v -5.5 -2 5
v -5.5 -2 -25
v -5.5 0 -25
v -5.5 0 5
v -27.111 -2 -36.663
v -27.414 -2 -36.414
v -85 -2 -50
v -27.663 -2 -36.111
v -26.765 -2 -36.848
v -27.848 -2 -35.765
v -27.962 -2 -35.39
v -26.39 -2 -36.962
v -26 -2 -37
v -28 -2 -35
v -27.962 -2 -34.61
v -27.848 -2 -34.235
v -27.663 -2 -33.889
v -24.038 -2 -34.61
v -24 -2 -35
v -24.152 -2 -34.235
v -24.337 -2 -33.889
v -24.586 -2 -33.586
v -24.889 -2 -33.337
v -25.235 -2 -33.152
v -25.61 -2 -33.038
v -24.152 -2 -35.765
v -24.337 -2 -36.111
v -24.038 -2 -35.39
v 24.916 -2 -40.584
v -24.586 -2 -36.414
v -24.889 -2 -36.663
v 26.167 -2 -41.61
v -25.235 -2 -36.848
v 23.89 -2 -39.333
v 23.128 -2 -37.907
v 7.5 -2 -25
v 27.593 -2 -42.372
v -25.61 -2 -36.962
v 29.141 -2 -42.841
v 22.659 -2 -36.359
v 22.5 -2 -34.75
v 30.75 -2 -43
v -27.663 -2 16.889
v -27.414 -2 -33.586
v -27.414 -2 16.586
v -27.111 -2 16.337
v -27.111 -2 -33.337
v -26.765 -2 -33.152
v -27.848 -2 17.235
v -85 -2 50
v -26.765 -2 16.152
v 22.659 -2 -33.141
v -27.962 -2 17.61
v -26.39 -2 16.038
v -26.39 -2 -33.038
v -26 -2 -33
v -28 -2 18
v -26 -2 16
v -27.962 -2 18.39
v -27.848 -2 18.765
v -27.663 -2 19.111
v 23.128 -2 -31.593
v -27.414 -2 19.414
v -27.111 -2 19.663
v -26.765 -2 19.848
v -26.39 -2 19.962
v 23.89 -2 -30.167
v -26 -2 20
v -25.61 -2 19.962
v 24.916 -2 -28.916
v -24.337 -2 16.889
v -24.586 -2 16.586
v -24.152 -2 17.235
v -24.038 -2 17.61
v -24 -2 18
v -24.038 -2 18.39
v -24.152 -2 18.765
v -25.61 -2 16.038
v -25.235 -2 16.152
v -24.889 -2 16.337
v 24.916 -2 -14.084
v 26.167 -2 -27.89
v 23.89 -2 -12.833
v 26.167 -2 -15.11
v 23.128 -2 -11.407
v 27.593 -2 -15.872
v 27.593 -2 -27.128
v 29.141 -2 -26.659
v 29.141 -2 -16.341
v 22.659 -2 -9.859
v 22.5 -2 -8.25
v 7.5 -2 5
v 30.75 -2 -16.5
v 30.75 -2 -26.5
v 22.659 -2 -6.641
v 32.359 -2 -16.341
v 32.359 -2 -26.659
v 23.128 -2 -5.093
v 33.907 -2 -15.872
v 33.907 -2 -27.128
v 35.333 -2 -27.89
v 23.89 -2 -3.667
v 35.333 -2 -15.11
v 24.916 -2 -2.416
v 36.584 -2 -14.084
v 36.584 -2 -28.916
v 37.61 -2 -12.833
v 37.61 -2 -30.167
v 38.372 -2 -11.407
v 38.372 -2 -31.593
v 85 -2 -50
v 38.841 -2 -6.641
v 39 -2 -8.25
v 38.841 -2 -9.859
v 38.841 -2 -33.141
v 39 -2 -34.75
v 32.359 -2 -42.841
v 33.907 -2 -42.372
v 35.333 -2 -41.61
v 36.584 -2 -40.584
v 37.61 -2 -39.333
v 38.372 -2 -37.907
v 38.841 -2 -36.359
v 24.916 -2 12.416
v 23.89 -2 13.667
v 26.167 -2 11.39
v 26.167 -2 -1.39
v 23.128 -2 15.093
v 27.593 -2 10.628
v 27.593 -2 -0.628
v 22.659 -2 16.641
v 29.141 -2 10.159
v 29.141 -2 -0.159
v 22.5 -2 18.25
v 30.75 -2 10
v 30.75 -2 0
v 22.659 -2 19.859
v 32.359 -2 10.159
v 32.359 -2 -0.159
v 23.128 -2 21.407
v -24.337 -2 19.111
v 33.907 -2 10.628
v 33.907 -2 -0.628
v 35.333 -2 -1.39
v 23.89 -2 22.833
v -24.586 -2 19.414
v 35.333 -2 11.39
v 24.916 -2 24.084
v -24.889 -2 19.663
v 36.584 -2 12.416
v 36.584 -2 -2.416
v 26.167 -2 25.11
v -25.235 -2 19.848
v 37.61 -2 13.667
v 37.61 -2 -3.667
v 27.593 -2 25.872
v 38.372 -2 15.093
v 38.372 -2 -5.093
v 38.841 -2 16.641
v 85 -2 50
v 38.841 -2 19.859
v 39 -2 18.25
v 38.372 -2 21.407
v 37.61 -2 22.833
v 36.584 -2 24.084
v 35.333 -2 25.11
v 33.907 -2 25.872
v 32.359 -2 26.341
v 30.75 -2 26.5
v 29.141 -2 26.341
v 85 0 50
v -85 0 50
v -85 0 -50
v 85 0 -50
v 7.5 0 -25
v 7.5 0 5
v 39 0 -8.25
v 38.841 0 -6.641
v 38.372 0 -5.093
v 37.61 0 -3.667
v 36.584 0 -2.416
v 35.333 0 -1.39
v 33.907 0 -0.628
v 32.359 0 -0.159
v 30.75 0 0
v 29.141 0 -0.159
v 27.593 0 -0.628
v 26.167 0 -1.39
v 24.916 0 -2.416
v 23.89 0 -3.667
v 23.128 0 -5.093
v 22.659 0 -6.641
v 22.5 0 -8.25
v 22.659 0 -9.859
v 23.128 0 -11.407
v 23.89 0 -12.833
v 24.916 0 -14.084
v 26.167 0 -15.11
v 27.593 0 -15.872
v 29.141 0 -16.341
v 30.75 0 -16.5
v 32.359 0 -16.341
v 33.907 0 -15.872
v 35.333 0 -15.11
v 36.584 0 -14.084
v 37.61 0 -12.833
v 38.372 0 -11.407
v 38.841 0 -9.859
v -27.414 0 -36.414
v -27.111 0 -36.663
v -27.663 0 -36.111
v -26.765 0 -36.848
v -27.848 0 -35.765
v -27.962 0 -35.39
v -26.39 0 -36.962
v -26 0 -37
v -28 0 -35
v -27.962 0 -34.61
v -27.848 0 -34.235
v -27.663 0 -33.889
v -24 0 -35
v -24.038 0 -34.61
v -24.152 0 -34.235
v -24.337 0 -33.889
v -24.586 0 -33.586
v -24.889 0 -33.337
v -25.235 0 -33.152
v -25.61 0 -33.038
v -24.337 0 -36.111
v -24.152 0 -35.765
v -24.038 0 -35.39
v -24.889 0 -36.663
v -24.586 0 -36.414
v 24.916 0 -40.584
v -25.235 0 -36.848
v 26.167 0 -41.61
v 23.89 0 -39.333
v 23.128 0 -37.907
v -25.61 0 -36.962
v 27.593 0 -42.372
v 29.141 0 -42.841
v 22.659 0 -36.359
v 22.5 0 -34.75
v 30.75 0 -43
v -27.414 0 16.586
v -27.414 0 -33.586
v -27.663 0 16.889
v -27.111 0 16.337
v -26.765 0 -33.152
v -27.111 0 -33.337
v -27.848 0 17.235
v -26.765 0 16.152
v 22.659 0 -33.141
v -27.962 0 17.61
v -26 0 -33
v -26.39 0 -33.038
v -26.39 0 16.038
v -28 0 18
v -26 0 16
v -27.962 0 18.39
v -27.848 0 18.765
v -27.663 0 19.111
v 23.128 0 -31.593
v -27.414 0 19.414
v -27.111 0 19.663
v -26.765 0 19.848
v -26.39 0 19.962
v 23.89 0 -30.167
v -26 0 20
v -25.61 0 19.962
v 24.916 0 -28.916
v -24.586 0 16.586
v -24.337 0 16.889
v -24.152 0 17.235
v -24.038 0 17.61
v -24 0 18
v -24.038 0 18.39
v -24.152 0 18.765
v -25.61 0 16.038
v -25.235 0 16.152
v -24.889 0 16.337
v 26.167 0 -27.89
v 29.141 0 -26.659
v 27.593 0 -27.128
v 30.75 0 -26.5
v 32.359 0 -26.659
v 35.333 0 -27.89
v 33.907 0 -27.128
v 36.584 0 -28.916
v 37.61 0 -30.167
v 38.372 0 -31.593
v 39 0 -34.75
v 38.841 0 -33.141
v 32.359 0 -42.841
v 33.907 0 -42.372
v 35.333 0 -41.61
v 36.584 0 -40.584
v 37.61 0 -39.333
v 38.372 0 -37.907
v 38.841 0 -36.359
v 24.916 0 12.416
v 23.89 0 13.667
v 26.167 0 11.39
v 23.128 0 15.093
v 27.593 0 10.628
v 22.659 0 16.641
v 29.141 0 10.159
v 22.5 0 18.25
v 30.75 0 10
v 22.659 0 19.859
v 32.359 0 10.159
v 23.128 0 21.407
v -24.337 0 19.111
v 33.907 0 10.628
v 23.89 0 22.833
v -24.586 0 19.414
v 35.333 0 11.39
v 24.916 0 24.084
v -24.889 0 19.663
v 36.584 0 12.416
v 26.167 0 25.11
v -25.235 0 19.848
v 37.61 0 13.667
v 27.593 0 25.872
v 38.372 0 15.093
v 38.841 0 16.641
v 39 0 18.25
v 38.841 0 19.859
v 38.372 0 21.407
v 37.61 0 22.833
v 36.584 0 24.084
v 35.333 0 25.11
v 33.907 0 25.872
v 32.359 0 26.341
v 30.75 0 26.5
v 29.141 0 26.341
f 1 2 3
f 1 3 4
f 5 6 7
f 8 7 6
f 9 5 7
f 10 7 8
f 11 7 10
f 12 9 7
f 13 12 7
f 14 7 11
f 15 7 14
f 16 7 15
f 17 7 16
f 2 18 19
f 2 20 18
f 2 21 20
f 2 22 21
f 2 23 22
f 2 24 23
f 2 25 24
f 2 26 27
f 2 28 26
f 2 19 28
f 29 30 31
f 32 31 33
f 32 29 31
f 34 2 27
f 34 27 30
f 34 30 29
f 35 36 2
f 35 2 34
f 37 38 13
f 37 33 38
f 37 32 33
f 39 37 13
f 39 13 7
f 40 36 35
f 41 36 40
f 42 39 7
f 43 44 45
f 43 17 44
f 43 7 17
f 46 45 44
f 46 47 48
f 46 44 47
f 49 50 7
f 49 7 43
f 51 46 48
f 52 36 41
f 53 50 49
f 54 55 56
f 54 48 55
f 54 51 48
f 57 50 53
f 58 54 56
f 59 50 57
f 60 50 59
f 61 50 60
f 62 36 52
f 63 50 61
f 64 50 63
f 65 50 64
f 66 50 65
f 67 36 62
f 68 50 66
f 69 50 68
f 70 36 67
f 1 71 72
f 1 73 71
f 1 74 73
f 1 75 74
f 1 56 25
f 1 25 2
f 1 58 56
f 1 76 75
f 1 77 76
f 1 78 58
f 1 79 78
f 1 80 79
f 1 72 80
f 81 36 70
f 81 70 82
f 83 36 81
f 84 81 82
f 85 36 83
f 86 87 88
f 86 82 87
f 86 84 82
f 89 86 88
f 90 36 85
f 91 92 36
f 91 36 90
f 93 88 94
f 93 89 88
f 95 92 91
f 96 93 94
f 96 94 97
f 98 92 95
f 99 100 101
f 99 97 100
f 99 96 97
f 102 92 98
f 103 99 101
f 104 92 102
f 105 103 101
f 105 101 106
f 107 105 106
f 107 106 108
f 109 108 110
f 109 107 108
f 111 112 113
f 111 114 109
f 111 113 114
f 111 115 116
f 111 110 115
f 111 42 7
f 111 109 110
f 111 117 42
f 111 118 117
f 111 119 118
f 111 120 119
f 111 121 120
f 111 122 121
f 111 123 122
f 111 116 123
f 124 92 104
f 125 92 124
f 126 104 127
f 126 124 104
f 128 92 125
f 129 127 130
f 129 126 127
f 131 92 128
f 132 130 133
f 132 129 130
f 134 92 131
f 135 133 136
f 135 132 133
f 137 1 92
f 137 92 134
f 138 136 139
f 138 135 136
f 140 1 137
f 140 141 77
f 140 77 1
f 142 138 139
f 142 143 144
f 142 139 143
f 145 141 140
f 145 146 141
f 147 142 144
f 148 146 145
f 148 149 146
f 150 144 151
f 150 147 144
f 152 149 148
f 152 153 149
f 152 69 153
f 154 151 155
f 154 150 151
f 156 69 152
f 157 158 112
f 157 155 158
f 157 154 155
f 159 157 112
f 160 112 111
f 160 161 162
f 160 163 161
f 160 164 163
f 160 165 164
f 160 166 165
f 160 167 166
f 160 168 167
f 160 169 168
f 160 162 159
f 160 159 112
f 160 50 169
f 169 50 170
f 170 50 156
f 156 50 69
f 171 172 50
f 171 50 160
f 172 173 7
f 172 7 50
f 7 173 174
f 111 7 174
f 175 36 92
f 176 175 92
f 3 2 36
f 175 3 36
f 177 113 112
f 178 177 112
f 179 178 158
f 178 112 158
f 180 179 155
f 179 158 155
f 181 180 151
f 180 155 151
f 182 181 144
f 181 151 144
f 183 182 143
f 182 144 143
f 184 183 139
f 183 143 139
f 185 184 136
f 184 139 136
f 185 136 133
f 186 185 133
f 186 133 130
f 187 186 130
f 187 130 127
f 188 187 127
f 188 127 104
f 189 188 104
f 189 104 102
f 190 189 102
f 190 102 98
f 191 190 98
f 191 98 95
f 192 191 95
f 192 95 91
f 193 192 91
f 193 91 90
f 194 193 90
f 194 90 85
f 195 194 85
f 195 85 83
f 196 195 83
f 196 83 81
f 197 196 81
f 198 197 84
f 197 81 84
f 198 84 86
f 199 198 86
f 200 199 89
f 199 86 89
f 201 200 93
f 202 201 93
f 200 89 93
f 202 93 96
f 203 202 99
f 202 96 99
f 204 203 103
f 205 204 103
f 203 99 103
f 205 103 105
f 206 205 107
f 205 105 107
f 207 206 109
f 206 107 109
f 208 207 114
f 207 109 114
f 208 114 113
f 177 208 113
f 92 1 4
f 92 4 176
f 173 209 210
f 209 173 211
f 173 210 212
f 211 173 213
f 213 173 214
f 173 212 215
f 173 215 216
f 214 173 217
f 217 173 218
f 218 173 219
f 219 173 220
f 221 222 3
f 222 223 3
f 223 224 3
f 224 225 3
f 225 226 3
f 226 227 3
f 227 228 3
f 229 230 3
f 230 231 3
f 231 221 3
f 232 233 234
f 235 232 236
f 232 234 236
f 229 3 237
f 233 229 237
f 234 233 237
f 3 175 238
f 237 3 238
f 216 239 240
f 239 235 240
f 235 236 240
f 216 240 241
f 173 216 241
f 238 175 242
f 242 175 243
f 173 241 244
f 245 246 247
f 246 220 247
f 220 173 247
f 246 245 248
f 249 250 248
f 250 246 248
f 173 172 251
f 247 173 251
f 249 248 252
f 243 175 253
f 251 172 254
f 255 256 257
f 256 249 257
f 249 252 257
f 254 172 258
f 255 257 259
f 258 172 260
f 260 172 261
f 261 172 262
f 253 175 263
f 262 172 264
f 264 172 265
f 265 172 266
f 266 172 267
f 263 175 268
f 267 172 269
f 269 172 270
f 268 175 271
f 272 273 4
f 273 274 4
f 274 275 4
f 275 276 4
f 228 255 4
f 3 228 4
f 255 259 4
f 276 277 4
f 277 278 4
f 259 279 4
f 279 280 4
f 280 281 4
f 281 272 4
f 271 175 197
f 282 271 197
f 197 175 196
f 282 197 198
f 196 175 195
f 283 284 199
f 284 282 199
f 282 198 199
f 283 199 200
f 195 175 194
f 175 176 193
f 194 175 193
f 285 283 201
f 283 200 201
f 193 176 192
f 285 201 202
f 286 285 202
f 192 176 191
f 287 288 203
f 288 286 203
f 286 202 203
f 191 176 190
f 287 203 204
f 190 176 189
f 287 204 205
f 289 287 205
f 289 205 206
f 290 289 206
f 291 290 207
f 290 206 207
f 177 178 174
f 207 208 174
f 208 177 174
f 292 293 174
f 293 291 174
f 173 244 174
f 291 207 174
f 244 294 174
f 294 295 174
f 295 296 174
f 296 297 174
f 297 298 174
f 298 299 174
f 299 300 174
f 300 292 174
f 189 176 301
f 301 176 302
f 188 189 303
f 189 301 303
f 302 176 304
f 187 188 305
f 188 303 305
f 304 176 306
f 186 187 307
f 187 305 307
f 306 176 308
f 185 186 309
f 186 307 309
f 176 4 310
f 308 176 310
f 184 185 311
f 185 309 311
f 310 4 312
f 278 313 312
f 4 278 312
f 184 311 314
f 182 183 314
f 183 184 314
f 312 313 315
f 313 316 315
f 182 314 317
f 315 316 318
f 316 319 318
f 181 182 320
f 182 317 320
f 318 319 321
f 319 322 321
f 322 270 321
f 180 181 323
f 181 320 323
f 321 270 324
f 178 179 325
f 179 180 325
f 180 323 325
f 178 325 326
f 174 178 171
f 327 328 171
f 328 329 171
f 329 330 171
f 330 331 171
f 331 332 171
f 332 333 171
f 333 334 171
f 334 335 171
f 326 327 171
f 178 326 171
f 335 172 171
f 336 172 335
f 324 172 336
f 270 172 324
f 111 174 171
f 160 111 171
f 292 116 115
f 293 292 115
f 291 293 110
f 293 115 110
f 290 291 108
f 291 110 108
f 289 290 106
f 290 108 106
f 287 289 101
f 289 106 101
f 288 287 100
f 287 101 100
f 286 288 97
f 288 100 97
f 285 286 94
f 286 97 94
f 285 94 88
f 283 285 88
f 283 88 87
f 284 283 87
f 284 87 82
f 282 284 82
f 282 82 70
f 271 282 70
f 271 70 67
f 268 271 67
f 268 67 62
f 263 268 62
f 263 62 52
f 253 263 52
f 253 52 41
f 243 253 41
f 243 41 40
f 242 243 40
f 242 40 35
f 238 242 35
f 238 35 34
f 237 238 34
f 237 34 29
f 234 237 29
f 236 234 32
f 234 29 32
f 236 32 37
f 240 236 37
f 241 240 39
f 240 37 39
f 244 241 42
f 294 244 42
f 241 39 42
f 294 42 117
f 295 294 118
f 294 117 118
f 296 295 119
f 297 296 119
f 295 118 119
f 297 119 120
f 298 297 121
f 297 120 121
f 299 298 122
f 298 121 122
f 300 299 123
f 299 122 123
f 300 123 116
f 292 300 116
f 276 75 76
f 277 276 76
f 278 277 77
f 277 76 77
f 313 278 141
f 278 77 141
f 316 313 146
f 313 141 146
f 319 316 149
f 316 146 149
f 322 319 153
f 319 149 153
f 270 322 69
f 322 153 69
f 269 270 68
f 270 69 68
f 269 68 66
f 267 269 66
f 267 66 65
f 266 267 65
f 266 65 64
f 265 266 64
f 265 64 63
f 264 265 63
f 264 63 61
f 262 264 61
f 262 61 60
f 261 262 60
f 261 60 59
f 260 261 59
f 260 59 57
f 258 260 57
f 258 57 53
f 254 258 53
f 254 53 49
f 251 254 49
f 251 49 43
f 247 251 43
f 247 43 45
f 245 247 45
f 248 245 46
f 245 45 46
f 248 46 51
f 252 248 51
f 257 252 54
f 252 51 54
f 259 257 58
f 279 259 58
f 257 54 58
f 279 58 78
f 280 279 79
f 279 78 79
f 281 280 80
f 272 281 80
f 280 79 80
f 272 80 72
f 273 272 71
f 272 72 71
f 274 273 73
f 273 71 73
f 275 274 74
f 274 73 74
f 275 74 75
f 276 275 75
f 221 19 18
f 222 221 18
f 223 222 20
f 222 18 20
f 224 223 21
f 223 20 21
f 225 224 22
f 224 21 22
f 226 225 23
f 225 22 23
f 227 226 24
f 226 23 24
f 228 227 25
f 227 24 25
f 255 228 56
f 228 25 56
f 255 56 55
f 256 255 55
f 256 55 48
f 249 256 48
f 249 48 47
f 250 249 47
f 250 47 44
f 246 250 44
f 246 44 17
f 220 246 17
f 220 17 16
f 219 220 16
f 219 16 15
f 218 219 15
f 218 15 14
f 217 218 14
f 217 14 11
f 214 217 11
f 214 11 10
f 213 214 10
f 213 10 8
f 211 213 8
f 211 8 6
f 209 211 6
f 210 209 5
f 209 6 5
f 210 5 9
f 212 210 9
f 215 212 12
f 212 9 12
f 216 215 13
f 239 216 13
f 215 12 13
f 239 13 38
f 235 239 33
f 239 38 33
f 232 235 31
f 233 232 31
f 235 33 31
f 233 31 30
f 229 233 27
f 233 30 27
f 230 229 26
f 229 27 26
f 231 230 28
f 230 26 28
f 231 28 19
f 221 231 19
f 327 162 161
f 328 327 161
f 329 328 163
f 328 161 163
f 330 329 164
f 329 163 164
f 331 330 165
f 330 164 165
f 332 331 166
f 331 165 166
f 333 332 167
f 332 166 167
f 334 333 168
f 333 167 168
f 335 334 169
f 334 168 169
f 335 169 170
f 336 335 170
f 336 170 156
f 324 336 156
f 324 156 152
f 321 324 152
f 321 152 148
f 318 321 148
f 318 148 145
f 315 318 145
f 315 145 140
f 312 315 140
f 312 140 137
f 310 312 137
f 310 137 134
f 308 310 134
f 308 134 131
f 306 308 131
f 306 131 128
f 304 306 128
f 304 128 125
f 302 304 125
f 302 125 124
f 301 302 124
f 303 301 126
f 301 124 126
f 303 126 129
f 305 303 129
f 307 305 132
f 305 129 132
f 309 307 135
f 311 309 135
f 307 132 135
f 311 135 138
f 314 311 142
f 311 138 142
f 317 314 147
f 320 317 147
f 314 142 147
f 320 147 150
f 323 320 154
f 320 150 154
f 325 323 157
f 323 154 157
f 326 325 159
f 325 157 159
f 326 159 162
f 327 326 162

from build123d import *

# Parameters (mm, degrees)
F0_W     = 170
F0_H     = 100
F1_DEPTH = 2
F2_R     = 8.25
F2_W     = 13
F2_H     = 30
F2_R_2   = 2
F3_DEPTH = 25


with BuildPart() as f1:
    # F0 (on Front) → F1 (new body)
    with BuildSketch(Plane.XZ):
        Rectangle(F0_W, F0_H)
    extrude(amount=F1_DEPTH)

    # F2 (on face) → F3 (cut)
    with BuildSketch(Plane.XZ.offset(2)):
        with Locations((30.75, -34.75)):
            Circle(F2_R)
        with Locations((30.75, -8.25)):
            Circle(F2_R)
        with Locations((30.75, 18.25)):
            Circle(F2_R)
        with Locations((1, -10)):
            Rectangle(F2_W, F2_H)
        with Locations((-26, -35)):
            Circle(F2_R_2)
        with Locations((-26, 18)):
            Circle(F2_R_2)
    extrude(amount=-F3_DEPTH, mode=Mode.SUBTRACT)


solid = f1.part
